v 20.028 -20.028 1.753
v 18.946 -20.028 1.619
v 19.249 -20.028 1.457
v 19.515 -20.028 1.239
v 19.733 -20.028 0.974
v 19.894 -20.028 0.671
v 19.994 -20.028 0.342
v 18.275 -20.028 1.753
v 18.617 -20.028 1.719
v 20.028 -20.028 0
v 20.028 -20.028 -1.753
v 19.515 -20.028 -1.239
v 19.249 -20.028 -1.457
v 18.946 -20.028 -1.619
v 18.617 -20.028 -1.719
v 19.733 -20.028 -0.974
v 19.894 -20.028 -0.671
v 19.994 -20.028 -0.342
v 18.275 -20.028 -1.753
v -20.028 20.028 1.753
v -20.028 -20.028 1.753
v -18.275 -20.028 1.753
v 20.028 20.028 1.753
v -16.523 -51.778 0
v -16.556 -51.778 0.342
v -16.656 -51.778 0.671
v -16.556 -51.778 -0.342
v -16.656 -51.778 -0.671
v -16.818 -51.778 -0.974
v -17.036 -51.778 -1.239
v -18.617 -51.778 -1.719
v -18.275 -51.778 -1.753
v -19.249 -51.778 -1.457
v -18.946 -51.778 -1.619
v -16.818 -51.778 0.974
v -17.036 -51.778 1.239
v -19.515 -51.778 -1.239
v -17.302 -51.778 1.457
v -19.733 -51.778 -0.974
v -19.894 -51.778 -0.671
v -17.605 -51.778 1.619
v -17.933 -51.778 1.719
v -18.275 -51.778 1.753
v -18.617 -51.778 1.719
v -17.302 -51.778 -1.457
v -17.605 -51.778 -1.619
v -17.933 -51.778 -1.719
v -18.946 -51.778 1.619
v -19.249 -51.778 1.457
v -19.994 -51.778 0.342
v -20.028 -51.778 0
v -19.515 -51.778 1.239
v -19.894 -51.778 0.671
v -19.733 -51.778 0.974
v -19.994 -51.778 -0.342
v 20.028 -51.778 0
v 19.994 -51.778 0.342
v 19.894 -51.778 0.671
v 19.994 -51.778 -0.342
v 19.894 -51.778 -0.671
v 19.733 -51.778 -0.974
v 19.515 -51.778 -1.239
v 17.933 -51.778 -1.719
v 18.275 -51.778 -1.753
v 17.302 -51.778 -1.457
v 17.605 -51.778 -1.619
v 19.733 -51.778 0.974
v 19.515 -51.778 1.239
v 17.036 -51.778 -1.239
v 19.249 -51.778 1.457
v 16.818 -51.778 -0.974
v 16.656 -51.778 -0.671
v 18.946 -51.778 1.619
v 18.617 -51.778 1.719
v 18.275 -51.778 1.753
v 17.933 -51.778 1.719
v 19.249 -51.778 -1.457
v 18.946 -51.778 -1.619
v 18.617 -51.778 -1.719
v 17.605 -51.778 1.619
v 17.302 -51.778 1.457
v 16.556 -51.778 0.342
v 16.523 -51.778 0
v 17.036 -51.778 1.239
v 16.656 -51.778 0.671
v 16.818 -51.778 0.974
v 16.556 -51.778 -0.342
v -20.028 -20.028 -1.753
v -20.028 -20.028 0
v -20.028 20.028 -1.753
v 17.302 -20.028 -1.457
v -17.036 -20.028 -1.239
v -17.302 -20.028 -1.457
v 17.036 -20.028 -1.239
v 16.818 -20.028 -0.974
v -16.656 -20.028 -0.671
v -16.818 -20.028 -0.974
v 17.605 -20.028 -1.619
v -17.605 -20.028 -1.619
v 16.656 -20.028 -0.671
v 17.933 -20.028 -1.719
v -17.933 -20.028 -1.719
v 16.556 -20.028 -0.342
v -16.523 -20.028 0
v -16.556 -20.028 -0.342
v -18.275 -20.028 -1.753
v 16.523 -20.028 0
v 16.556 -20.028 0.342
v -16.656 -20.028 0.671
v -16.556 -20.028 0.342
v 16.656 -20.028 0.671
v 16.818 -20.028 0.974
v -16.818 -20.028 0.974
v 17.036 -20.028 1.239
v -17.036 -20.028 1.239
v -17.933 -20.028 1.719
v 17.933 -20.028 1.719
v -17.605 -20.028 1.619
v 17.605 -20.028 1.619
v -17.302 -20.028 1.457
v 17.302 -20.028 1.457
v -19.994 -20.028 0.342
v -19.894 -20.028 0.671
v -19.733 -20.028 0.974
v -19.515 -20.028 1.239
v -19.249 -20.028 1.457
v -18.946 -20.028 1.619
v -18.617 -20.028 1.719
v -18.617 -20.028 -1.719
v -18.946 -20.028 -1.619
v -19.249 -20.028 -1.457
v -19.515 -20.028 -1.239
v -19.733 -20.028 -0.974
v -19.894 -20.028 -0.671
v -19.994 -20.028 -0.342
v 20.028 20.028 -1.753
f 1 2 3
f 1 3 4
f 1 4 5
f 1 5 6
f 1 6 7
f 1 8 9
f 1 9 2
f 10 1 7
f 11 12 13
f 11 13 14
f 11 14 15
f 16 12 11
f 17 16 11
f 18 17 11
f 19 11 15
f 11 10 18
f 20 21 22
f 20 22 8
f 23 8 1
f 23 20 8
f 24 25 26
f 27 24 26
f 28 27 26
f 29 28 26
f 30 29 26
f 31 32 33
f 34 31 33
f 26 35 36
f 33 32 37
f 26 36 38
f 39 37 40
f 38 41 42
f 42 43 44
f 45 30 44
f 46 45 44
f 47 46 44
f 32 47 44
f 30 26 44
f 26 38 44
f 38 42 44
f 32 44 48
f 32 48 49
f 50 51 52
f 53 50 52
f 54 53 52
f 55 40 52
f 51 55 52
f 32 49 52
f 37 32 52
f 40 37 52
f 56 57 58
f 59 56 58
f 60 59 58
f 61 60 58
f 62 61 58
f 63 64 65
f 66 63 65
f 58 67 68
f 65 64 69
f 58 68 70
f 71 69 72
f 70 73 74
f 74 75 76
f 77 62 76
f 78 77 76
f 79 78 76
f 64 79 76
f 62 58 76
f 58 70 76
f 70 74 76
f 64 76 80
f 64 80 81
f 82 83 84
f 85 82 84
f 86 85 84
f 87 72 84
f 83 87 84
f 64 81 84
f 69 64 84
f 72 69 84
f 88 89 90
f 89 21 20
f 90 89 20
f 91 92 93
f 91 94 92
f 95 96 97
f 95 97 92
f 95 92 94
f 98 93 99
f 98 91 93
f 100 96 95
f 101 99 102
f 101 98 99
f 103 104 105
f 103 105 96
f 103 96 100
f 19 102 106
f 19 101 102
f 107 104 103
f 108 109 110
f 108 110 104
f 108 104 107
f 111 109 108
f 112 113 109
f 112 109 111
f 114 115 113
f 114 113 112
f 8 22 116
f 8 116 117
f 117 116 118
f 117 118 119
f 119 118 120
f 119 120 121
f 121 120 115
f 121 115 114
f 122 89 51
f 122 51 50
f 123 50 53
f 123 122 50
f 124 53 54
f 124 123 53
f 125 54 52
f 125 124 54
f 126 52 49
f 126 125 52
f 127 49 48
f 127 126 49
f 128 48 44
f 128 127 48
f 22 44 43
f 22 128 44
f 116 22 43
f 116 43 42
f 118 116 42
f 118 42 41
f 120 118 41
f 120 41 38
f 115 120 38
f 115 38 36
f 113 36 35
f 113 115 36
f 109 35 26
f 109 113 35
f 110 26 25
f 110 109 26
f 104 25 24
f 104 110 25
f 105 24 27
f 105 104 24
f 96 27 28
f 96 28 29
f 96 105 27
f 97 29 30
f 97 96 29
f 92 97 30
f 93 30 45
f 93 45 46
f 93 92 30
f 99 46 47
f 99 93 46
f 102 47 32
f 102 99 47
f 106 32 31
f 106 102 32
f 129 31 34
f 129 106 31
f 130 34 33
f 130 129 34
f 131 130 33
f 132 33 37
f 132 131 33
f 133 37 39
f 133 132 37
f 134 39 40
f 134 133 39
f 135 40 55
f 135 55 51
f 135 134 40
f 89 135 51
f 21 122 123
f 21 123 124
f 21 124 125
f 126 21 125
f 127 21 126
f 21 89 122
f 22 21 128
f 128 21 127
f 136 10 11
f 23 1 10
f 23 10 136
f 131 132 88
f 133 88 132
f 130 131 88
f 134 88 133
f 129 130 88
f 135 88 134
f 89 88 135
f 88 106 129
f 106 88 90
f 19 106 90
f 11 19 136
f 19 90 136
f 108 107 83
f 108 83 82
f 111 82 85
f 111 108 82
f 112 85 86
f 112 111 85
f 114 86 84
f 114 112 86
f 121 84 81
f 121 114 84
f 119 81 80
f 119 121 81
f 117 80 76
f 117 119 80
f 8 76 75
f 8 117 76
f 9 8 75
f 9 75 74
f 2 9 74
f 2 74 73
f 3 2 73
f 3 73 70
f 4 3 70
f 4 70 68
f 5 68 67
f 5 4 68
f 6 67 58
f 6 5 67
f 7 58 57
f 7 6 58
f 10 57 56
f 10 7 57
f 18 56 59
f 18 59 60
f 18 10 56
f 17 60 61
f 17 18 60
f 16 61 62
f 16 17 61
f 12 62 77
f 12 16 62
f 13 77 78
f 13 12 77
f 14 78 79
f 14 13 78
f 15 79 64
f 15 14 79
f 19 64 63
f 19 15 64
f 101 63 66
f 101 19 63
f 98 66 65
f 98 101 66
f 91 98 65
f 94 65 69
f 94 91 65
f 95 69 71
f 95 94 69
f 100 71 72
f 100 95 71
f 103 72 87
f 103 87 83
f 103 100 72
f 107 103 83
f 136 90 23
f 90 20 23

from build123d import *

# Parameters (mm, degrees)
F0_W     = 40.0558
F0_H     = 40.0558
F1_DEPTH = 1.7526
F3_R     = 1.7526
F4_DEPTH = 31.75
F5_W     = 40.0558
F5_H     = 40.0558
F6_DEPTH = 0.019685
F7_W     = 40.0558
F7_H     = 44.069
F8_DEPTH = 0.019685


with BuildPart() as f1:
    # F0 (on Top) → F1 (new body, symmetric)
    with BuildSketch(Plane.XY):
        Rectangle(F0_W, F0_H)
    extrude(amount=F1_DEPTH, both=True)

    # F3 (on face) → F4 (join)
    with BuildSketch(Plane(origin=(0, -20.0279, 0), x_dir=(-1, 0, 0), z_dir=(0, 1, 0))):
        with Locations((-18.2753, 0)):
            Circle(F3_R)
        with Locations((18.2753, 0)):
            Circle(F3_R)
    extrude(amount=-F4_DEPTH)


with BuildPart() as f6:
    # F5 (on face) → F6 (new body)
    with BuildSketch(Plane.XY):
        Rectangle(F5_W, F5_H)
    extrude(amount=F6_DEPTH)


with BuildPart() as f8:
    # F7 (on face) → F8 (new body)
    with BuildSketch(Plane(origin=(0, 0, -1.7526), x_dir=(1, 0, 0), z_dir=(0, 0, -1))):
        with Locations((0, 2.0066)):
            Rectangle(F7_W, F7_H)
    extrude(amount=F8_DEPTH)


solid = f1.part
